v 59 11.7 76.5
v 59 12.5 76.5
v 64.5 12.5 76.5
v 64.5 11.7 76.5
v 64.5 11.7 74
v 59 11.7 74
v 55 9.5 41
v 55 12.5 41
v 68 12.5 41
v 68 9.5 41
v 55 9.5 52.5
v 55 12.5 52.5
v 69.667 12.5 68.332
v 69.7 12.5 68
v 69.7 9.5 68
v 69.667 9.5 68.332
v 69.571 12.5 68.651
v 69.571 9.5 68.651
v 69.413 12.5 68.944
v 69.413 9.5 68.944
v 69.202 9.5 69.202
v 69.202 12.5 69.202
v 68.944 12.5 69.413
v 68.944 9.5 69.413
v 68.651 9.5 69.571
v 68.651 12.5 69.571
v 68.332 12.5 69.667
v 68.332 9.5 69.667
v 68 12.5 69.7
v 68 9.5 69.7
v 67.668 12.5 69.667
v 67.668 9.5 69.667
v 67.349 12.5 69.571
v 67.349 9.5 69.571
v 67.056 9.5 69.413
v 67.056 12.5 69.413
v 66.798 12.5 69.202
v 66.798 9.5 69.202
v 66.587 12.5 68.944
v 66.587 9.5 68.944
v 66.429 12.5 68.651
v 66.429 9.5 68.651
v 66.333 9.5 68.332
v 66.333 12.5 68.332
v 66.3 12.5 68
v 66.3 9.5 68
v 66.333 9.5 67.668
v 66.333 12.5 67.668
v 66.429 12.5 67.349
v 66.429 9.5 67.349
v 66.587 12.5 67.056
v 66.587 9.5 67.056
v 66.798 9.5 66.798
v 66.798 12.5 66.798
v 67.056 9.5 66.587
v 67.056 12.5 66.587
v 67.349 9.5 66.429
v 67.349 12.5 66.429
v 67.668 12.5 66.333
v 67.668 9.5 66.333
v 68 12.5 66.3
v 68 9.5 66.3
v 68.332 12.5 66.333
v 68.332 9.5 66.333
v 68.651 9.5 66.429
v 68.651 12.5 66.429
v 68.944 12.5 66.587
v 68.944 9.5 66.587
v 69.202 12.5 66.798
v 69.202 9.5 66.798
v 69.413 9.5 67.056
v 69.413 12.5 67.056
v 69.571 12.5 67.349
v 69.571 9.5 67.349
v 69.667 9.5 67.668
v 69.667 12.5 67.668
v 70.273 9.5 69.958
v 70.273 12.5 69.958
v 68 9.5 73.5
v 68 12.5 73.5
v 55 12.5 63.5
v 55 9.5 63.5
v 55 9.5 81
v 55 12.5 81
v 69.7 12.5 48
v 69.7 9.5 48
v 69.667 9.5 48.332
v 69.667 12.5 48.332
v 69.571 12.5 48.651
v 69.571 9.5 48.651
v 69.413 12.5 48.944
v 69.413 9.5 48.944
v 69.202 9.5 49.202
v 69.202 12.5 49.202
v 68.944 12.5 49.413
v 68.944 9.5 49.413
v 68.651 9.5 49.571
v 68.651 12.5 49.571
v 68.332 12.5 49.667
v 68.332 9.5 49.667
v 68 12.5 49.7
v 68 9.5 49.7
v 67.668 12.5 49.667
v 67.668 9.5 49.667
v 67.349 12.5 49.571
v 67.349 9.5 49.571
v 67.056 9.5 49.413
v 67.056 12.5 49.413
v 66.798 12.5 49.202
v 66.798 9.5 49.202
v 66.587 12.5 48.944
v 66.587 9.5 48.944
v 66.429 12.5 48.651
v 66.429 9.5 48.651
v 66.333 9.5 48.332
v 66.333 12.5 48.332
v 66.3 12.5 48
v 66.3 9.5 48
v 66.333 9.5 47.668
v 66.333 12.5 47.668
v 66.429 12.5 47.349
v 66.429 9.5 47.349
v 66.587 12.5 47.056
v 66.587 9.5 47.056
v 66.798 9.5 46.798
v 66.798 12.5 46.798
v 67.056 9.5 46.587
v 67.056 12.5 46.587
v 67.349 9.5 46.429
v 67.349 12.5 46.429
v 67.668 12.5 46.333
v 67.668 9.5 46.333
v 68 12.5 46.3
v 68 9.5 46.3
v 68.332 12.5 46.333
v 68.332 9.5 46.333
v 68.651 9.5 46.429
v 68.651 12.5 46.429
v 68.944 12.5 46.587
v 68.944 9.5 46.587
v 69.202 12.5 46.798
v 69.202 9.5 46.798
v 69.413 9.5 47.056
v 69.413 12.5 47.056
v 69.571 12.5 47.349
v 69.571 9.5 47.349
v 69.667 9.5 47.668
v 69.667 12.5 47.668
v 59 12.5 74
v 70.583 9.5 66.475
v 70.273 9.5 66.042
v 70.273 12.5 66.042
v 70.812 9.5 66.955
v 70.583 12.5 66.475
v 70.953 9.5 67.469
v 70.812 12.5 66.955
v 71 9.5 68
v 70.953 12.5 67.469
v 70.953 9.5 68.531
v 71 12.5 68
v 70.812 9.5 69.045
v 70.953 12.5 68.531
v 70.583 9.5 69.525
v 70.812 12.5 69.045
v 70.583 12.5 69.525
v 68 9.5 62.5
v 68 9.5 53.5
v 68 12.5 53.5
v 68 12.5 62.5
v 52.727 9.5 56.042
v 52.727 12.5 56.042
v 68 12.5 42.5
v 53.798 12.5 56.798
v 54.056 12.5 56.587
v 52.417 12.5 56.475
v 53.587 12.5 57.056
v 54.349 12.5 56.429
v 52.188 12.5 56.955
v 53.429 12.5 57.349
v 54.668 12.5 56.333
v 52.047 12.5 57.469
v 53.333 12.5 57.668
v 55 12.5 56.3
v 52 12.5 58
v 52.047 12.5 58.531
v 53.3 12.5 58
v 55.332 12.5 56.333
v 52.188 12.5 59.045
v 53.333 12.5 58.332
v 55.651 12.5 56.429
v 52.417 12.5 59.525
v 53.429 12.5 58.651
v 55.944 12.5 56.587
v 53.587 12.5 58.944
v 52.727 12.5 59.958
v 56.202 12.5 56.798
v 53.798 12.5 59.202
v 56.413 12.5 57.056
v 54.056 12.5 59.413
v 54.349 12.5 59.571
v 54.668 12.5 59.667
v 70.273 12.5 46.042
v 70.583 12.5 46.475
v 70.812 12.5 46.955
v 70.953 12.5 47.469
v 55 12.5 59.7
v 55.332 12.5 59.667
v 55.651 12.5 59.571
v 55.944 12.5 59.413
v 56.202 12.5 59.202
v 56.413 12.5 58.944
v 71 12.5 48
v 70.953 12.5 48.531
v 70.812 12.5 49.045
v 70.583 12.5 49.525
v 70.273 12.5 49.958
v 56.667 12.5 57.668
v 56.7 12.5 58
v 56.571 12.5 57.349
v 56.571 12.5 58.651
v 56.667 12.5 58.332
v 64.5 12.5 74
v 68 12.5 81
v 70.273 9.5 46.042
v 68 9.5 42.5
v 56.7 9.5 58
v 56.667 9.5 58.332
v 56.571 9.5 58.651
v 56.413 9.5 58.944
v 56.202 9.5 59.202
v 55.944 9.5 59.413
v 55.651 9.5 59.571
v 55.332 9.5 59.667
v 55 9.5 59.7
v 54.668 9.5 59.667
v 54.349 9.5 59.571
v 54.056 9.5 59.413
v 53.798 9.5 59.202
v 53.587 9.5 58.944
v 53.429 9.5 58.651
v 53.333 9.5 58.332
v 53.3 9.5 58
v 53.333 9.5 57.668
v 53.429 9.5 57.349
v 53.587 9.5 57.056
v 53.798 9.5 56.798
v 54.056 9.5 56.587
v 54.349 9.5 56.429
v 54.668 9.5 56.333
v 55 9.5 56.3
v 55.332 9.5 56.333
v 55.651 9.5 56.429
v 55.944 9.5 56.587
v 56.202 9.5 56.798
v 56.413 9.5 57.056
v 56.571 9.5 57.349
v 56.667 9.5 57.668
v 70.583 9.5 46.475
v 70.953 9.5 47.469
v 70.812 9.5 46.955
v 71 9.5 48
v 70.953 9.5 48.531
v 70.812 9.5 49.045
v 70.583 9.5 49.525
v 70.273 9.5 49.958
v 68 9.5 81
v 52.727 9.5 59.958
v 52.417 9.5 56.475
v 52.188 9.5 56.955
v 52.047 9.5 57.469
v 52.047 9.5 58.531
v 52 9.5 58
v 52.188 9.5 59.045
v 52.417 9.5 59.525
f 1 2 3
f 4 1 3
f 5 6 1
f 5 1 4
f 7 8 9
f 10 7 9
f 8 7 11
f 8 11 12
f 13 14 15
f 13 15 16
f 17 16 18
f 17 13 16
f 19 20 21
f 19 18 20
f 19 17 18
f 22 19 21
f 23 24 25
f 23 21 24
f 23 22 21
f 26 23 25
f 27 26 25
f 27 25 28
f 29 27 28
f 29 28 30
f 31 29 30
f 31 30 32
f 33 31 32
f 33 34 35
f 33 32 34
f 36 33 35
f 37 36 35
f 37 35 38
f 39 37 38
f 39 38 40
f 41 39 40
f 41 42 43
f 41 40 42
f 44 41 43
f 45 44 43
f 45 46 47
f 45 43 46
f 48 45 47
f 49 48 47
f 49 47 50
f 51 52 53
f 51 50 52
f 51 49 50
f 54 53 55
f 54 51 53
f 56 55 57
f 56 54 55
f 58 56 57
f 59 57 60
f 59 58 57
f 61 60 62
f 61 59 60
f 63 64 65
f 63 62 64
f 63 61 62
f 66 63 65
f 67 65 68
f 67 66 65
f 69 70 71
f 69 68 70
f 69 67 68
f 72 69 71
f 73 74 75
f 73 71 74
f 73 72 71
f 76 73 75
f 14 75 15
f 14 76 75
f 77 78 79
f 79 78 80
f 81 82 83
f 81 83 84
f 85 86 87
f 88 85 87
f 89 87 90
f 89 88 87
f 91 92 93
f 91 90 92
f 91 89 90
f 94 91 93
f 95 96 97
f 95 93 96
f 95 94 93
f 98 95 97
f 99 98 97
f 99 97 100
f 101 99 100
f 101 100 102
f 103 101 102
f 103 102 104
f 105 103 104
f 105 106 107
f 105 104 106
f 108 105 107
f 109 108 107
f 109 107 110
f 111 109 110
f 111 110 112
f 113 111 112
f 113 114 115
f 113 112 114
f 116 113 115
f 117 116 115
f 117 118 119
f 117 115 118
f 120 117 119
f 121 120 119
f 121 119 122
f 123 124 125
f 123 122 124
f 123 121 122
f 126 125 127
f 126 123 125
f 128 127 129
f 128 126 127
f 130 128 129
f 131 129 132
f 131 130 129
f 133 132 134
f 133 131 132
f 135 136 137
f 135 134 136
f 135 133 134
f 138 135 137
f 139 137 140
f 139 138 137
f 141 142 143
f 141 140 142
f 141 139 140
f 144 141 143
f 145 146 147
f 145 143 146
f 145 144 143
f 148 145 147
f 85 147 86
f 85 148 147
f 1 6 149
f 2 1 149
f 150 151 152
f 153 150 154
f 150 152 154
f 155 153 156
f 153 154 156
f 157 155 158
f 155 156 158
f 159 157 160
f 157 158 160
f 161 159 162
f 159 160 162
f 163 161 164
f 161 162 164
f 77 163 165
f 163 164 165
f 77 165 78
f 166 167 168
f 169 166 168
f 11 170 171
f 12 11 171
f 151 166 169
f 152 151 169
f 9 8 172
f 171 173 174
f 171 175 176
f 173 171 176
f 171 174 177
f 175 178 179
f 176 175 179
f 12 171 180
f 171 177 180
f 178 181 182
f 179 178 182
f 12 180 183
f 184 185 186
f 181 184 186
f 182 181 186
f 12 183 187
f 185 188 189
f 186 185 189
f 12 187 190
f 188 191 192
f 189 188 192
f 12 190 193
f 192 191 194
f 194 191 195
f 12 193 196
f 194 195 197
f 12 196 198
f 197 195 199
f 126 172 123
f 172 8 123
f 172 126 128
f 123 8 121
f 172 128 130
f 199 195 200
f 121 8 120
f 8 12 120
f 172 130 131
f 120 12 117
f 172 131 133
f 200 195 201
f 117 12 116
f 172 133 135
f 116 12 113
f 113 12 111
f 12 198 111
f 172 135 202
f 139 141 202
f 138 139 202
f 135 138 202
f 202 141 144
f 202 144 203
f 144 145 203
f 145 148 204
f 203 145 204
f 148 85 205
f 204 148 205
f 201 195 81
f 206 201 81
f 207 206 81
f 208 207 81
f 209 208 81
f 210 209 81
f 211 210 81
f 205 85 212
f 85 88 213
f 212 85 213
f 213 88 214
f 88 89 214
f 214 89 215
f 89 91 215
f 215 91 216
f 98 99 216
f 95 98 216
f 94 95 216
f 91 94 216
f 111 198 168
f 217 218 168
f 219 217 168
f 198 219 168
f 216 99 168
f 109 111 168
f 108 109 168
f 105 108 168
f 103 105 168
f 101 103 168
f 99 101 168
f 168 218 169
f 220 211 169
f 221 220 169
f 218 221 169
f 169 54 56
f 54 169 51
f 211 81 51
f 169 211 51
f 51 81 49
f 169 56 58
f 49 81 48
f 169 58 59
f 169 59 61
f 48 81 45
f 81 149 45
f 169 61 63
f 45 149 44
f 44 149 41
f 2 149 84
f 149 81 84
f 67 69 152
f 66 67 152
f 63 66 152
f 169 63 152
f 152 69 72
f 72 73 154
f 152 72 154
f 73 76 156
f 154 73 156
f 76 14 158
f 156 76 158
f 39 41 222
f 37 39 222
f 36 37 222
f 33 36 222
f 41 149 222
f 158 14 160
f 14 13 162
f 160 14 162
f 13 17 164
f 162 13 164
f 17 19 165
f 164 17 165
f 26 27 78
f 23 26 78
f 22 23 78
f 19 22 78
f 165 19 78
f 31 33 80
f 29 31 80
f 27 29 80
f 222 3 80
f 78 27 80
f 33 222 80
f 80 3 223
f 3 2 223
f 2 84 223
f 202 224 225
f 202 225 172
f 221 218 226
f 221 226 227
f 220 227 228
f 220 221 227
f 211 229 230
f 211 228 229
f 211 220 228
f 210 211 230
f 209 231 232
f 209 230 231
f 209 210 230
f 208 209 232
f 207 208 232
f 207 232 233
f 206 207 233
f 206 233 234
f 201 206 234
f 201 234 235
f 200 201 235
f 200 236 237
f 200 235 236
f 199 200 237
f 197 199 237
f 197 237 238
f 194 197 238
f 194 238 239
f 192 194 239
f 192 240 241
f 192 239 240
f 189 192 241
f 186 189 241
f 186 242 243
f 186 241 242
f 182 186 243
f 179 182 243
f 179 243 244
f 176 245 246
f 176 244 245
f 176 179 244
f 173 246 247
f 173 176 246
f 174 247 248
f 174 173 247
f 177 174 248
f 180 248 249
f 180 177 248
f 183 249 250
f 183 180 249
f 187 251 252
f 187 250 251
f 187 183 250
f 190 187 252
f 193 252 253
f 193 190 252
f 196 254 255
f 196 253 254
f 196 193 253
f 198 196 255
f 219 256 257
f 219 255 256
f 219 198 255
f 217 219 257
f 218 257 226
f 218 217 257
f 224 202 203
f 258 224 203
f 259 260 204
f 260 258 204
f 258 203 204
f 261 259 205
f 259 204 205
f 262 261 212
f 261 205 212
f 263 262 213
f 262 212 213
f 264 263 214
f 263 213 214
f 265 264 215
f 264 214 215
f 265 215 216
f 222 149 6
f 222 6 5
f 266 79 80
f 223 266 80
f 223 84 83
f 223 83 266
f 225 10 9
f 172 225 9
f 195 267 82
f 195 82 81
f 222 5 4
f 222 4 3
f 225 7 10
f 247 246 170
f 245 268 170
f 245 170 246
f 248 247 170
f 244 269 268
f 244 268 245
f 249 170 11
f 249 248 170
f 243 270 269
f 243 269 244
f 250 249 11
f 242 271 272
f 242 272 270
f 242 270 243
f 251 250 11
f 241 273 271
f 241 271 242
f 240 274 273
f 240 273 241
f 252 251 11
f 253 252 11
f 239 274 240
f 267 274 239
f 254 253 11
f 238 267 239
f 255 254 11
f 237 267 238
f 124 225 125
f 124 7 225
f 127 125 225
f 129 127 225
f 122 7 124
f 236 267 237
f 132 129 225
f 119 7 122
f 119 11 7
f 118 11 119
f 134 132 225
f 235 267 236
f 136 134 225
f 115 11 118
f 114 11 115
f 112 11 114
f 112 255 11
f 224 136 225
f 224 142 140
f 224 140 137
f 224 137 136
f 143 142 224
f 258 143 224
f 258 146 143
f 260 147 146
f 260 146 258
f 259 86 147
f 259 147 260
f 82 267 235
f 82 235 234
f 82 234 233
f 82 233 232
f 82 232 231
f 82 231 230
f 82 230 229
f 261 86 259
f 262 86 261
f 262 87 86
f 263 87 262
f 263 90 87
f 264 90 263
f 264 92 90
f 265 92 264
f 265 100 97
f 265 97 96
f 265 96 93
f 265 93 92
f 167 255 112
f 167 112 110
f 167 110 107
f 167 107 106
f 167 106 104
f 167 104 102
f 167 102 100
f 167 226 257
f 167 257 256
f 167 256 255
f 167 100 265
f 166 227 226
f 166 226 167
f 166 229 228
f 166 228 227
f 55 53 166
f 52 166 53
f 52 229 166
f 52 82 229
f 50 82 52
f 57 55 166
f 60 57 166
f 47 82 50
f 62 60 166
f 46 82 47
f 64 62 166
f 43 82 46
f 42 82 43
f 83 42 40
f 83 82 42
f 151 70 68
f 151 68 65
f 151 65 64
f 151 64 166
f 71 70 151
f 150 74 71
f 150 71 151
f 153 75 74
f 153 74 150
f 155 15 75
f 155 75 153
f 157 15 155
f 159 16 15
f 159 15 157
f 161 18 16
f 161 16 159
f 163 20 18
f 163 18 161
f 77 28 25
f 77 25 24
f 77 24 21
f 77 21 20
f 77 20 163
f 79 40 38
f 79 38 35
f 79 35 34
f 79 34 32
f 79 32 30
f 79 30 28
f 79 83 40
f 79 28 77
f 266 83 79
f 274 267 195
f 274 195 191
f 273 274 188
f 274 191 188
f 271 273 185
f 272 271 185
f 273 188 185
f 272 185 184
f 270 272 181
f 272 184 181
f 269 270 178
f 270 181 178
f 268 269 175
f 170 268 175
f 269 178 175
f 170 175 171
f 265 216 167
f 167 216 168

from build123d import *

# Parameters (mm, degrees)
BOX031_W               = 5.5
BOX031_H               = 10
BOX031_DEPTH           = 2.5
CYLINDER059_R          = 1.7
CYLINDER059_DEPTH      = 30
CYLINDER059_ROLL_ANGLE = 90
CYLINDER060_R          = 1.7
CYLINDER060_DEPTH      = 30
CYLINDER060_ROLL_ANGLE = 90
CYLINDER058_R          = 1.7
CYLINDER058_DEPTH      = 30
CYLINDER058_ROLL_ANGLE = 90
CYLINDER056_R          = 3
CYLINDER056_DEPTH      = 3
CYLINDER056_ROLL_ANGLE = 90
CYLINDER057_R          = 3
CYLINDER057_DEPTH      = 3
CYLINDER057_ROLL_ANGLE = 90
CYLINDER055_R          = 3
CYLINDER055_DEPTH      = 3
CYLINDER055_ROLL_ANGLE = 90
BOX029_W               = 13
BOX029_H               = 3
BOX029_DEPTH           = 40
CHAMFER007_SIZE        = 2.5


with BuildPart() as m3_nut_hole001:
    # Box031 → Box031 (new body)
    with BuildSketch(Plane(origin=(59, 11.7, 74), x_dir=(1, 0, 0), z_dir=(0, 0, 1))):
        with Locations((2.75, 5)):
            Rectangle(BOX031_W, BOX031_H)
    extrude(amount=BOX031_DEPTH)


with BuildPart() as cylinder098:
    # Cylinder059 → Cylinder059 (new body)
    with BuildSketch(Plane.XY):
        Circle(CYLINDER059_R)
    extrude(amount=CYLINDER059_DEPTH)


with BuildPart() as cylinder098_1:
    # Cylinder059 roll: moved
    add(cylinder098.part.rotate(Axis((0, 0, 0), (1, 0, 0)), CYLINDER059_ROLL_ANGLE))


with BuildPart() as cylinder098_2:
    # Cylinder059 placement: moved
    add(cylinder098_1.part.moved(Location((68, 26, 48))))


with BuildPart() as cylinder059:
    # Cylinder060 → Cylinder060 (new body)
    with BuildSketch(Plane.XY):
        Circle(CYLINDER060_R)
    extrude(amount=CYLINDER060_DEPTH)


with BuildPart() as cylinder059_1:
    # Cylinder060 roll: moved
    add(cylinder059.part.rotate(Axis((0, 0, 0), (1, 0, 0)), CYLINDER060_ROLL_ANGLE))


with BuildPart() as cylinder059_2:
    # Cylinder060 placement: moved
    add(cylinder059_1.part.moved(Location((68, 27, 68))))


with BuildPart() as fusion032:
    # Cylinder058 → Cylinder058 (new body)
    with BuildSketch(Plane.XY):
        Circle(CYLINDER058_R)
    extrude(amount=CYLINDER058_DEPTH)


with BuildPart() as fusion032_1:
    # Cylinder058 roll: moved
    add(fusion032.part.rotate(Axis((0, 0, 0), (1, 0, 0)), CYLINDER058_ROLL_ANGLE))


with BuildPart() as fusion032_2:
    # Cylinder058 placement: moved
    add(fusion032_1.part.moved(Location((55, 26, 58))))

    # Fusion032: union Cylinder098, Cylinder059
    add(cylinder098_2.part)
    add(cylinder059_2.part)


with BuildPart() as cylinder095:
    # Cylinder056 → Cylinder056 (new body)
    with BuildSketch(Plane.XY):
        Circle(CYLINDER056_R)
    extrude(amount=CYLINDER056_DEPTH)


with BuildPart() as cylinder095_1:
    # Cylinder056 roll: moved
    add(cylinder095.part.rotate(Axis((0, 0, 0), (1, 0, 0)), CYLINDER056_ROLL_ANGLE))


with BuildPart() as cylinder095_2:
    # Cylinder056 placement: moved
    add(cylinder095_1.part.moved(Location((68, 12.5, 68))))


with BuildPart() as cylinder096:
    # Cylinder057 → Cylinder057 (new body)
    with BuildSketch(Plane.XY):
        Circle(CYLINDER057_R)
    extrude(amount=CYLINDER057_DEPTH)


with BuildPart() as cylinder096_1:
    # Cylinder057 roll: moved
    add(cylinder096.part.rotate(Axis((0, 0, 0), (1, 0, 0)), CYLINDER057_ROLL_ANGLE))


with BuildPart() as cylinder096_2:
    # Cylinder057 placement: moved
    add(cylinder096_1.part.moved(Location((68, 12.5, 48))))


with BuildPart() as trolley_hubs_b:
    # Cylinder055 → Cylinder055 (new body)
    with BuildSketch(Plane.XY):
        Circle(CYLINDER055_R)
    extrude(amount=CYLINDER055_DEPTH)


with BuildPart() as trolley_hubs_b_1:
    # Cylinder055 roll: moved
    add(trolley_hubs_b.part.rotate(Axis((0, 0, 0), (1, 0, 0)), CYLINDER055_ROLL_ANGLE))


with BuildPart() as trolley_hubs_b_2:
    # Cylinder055 placement: moved
    add(trolley_hubs_b_1.part.moved(Location((55, 12.5, 58))))

    # Fusion050: union Cylinder095, Cylinder096
    add(cylinder095_2.part)
    add(cylinder096_2.part)


with BuildPart() as trolley_plate:
    # Box029 → Box029 (new body)
    with BuildSketch(Plane(origin=(55, 9.5, 41), x_dir=(1, 0, 0), z_dir=(0, 0, 1))):
        with Locations((6.5, 1.5)):
            Rectangle(BOX029_W, BOX029_H)
    extrude(amount=BOX029_DEPTH)

    # Fusion051: union trolley-hubs-b
    add(trolley_hubs_b_2.part)

    # Chamfer007
    chamfer007_edges = [trolley_plate.edges().sort_by_distance(p)[0] for p in [
        (55, 11, 55),
        (68, 11, 45),
        (55, 11, 61),
        (68, 11, 65),
        (68, 11, 51),
        (68, 11, 71),
    ]]
    chamfer(chamfer007_edges, length=CHAMFER007_SIZE)

    # Cut039: cut Fusion032
    add(fusion032_2.part, mode=Mode.SUBTRACT)

    # Cut040: cut M3-nut-hole001
    add(m3_nut_hole001.part, mode=Mode.SUBTRACT)


solid = trolley_plate.part
